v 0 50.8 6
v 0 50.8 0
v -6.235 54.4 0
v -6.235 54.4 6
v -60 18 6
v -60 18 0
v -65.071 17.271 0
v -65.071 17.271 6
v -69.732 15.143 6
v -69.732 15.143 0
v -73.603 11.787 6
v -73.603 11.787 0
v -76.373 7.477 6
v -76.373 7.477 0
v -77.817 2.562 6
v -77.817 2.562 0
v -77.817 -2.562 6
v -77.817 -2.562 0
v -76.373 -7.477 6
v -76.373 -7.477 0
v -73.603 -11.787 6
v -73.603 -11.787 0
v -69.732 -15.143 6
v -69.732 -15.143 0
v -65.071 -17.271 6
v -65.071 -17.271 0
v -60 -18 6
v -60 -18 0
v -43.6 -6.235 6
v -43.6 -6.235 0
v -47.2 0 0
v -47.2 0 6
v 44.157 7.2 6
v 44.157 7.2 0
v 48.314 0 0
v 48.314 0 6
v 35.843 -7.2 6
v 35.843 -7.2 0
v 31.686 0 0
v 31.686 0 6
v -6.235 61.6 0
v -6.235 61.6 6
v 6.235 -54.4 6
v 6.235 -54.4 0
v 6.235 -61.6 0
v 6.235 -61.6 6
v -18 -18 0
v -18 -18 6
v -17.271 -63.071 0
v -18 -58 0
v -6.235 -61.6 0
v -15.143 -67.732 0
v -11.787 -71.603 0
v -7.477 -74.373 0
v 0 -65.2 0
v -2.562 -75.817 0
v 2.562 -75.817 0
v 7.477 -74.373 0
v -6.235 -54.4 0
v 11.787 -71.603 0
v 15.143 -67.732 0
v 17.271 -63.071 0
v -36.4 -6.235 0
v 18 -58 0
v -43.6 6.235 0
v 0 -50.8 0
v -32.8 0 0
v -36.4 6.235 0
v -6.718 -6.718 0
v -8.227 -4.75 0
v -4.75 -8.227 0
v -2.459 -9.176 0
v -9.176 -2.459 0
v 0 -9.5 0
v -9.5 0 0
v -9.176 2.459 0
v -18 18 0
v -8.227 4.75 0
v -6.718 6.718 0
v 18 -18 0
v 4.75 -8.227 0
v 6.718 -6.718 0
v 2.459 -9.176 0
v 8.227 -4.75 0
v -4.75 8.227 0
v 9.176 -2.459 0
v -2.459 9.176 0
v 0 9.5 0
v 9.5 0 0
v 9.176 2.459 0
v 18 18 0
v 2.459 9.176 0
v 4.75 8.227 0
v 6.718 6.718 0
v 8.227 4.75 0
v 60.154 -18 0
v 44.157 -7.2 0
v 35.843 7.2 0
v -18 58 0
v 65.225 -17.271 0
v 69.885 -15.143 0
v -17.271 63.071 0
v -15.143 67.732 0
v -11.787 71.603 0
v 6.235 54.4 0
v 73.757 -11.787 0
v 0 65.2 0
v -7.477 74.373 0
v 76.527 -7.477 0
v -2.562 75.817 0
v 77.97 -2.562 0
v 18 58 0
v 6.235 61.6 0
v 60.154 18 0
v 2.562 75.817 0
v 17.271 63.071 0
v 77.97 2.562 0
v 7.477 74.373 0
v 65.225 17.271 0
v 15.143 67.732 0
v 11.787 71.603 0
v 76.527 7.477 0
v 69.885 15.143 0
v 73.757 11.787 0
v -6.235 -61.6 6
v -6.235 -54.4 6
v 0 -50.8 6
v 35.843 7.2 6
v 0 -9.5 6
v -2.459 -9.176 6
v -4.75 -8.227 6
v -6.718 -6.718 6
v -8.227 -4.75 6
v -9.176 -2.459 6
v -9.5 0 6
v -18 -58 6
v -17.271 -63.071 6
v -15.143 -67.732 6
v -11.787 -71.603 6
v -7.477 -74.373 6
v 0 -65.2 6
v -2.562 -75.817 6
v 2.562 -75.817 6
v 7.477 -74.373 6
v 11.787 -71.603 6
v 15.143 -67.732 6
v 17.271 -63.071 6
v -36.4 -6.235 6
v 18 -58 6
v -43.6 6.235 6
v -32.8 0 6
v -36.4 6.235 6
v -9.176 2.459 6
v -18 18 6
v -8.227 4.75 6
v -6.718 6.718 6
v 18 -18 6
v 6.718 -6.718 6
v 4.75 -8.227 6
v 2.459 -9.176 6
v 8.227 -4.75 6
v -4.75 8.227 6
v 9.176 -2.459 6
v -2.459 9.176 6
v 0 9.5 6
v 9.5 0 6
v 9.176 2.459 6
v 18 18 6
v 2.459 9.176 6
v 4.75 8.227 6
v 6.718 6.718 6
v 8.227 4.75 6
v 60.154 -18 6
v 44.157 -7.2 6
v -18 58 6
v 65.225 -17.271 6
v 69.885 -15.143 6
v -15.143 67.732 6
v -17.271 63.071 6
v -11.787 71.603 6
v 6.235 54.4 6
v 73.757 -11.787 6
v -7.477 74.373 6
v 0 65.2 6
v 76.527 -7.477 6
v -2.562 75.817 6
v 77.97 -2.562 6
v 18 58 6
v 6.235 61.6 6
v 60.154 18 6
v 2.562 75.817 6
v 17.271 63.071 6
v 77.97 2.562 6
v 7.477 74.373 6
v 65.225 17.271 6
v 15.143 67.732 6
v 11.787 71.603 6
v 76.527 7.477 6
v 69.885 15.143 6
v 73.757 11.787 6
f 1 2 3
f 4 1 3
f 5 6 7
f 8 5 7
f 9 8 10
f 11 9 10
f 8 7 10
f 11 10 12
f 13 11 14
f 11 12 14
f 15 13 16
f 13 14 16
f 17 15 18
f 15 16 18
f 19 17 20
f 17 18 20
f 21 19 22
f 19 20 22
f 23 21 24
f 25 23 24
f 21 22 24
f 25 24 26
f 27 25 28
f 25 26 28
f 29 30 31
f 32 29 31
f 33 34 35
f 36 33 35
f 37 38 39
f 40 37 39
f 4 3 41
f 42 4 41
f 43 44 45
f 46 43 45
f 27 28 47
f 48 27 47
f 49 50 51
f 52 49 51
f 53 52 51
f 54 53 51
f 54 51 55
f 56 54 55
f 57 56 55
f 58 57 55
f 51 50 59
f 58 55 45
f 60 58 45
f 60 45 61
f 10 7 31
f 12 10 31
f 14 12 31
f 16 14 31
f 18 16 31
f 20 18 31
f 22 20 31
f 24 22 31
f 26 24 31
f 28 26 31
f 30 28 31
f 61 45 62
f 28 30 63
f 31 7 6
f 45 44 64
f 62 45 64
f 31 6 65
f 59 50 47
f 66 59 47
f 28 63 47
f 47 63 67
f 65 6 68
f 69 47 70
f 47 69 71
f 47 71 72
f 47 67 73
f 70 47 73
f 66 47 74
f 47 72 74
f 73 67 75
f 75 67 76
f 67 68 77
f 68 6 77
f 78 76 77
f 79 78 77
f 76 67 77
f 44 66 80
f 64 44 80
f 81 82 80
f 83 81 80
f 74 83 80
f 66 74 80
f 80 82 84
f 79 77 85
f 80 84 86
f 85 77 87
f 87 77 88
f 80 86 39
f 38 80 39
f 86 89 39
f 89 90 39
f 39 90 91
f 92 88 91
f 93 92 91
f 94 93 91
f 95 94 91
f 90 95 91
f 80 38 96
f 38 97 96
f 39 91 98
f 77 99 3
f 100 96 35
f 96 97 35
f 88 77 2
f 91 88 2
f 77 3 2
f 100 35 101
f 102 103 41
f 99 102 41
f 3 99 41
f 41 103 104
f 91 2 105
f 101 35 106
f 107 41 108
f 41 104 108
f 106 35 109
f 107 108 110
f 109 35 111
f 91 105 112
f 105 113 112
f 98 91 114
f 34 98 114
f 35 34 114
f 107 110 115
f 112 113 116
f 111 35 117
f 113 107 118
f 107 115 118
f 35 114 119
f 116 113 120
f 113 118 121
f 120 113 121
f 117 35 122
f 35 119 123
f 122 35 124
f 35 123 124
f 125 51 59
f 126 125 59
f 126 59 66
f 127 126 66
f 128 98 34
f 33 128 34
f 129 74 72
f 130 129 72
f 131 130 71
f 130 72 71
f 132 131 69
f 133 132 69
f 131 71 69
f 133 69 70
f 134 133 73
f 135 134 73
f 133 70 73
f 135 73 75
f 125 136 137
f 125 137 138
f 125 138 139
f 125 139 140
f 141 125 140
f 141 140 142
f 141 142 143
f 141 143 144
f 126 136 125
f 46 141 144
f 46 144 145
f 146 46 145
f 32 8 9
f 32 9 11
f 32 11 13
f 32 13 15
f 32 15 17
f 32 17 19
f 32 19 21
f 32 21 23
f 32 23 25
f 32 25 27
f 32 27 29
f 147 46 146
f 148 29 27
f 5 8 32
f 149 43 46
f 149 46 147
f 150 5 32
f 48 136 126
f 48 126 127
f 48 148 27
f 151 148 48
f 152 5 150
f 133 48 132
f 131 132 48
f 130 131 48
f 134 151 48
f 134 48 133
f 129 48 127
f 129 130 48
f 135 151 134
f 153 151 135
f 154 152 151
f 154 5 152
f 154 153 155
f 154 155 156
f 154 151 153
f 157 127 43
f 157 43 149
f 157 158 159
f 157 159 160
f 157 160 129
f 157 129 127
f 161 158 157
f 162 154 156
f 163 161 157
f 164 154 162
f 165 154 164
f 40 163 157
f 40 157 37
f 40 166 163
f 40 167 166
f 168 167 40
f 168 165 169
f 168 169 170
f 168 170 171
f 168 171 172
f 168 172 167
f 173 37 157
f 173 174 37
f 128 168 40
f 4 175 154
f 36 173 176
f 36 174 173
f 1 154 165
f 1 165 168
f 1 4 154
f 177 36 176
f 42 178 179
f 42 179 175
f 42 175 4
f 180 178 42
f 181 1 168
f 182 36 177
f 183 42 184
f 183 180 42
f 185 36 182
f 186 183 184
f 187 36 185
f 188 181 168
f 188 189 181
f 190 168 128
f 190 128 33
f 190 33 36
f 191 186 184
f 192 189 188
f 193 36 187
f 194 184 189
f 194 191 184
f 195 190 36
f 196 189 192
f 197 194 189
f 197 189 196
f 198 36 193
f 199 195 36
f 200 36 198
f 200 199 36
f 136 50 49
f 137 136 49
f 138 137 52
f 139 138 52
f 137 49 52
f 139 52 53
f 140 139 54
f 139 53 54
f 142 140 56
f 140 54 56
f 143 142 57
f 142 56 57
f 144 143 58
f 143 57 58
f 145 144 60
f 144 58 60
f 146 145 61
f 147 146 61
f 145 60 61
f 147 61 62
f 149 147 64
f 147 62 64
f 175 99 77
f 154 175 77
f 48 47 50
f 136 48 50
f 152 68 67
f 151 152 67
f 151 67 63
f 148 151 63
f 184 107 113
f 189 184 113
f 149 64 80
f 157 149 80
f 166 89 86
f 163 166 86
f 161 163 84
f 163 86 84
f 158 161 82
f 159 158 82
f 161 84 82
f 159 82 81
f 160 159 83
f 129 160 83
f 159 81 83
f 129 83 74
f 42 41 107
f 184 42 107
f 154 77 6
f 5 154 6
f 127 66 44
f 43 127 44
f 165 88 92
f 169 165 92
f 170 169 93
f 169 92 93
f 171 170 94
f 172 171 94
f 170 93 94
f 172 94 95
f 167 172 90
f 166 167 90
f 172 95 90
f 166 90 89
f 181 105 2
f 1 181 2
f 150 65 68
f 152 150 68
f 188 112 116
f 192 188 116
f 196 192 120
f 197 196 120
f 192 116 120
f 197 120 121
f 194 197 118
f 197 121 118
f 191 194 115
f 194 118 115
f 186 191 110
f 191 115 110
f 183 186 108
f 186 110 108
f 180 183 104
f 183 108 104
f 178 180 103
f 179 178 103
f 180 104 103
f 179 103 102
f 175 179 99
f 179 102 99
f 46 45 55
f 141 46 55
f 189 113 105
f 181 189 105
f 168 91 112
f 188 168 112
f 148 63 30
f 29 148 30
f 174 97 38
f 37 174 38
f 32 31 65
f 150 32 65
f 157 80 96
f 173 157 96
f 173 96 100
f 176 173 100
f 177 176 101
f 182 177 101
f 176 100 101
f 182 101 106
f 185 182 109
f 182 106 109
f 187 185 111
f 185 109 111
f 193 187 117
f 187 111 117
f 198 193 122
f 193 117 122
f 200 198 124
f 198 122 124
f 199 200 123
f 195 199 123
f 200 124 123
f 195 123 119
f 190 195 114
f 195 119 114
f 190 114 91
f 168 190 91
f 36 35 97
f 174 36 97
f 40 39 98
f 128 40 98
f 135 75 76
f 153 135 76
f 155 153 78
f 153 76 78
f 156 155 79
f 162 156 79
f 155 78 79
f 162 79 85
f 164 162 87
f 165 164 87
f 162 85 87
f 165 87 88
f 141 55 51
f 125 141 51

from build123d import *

# Parameters (mm, degrees)
F1_DEPTH = 6


with BuildPart() as f1:
    # F0 (on Top) → F1 (new body)
    with BuildSketch(Plane.XY):
        with BuildLine():
            Line((18, 0), (9.5, 0))
            ThreePointArc((9.5, 0), (6.7175144213, -6.7175144213), (0, -9.5))
            Line((0, -9.5), (0, -18))
            Line((0, -18), (18, -18))
            Line((18, -18), (40, -18))
            Line((40, -18), (60.1537041366, -18))
            ThreePointArc((60.1537041366, -18), (78.1537041366, 0), (60.1537041366, 18))
            Line((60.1537041366, 18), (40, 18))
            Line((40, 18), (18, 18))
            Line((18, 18), (18, 0))
        make_face()
        Polygon((35.8430780618, -7.2), (31.6861561237, 0), (35.8430780618, 7.2), (44.1569219382, 7.2), (48.3138438763, 0), (44.1569219382, -7.2), align=None, mode=Mode.SUBTRACT)
        with BuildLine():
            ThreePointArc((0, 9.5), (6.7175144213, 6.7175144213), (9.5, 0))
            Line((9.5, 0), (18, 0))
            Line((18, 0), (18, 18))
            Line((18, 18), (0, 18))
            Line((0, 18), (0, 9.5))
        make_face()
        with BuildLine():
            ThreePointArc((-9.5, 0), (-6.7175144213, 6.7175144213), (0, 9.5))
            Line((0, 9.5), (0, 18))
            Line((0, 18), (-18, 18))
            Line((-18, 18), (-18, 0))
            Line((-18, 0), (-9.5, 0))
        make_face()
        with BuildLine():
            Line((0, -18), (0, -9.5))
            ThreePointArc((0, -9.5), (-6.7175144213, -6.7175144213), (-9.5, 0))
            Line((-9.5, 0), (-18, 0))
            Line((-18, 0), (-18, -18))
            Line((-18, -18), (0, -18))
        make_face()
        Polygon((0, 40), (0, 18), (18, 18), (18, 58), (6.2353829072, 58), (6.2353829072, 54.4), (0, 50.8), align=None)
        Polygon((-18, 18), (0, 18), (0, 40), (0, 50.8), (-6.2353829072, 54.4), (-6.2353829072, 58), (-18, 58), (-18, 40), align=None)
        Polygon((0, -50.8), (0, -18), (-18, -18), (-18, -58), (-6.2353829072, -58), (-6.2353829072, -54.4), align=None)
        Polygon((18, -18), (0, -18), (0, -50.8), (6.2353829072, -54.4), (6.2353829072, -58), (18, -58), align=None)
        with BuildLine():
            Line((-18, -18), (-18, 0))
            Line((-18, 0), (-18, 18))
            Line((-18, 18), (-40, 18))
            Line((-40, 18), (-60, 18))
            ThreePointArc((-60, 18), (-78, 0), (-60, -18))
            Line((-60, -18), (-40, -18))
            Line((-40, -18), (-18, -18))
        make_face()
        Polygon((-36.4, 6.2353829072), (-32.8, 0), (-36.4, -6.2353829072), (-43.6, -6.2353829072), (-47.2, 0), (-43.6, 6.2353829072), align=None, mode=Mode.SUBTRACT)
        with BuildLine():
            Line((6.2353829072, 58), (18, 58))
            ThreePointArc((18, 58), (0, 76), (-18, 58))
            Line((-18, 58), (-6.2353829072, 58))
            Line((-6.2353829072, 58), (-6.2353829072, 61.6))
            Line((-6.2353829072, 61.6), (0, 65.2))
            Line((0, 65.2), (6.2353829072, 61.6))
            Line((6.2353829072, 61.6), (6.2353829072, 58))
        make_face()
        with BuildLine():
            Line((-6.2353829072, -58), (-18, -58))
            ThreePointArc((-18, -58), (0, -76), (18, -58))
            Line((18, -58), (6.2353829072, -58))
            Line((6.2353829072, -58), (6.2353829072, -61.6))
            Line((6.2353829072, -61.6), (0, -65.2))
            Line((0, -65.2), (-6.2353829072, -61.6))
            Line((-6.2353829072, -61.6), (-6.2353829072, -58))
        make_face()
    extrude(amount=F1_DEPTH)


solid = f1.part
